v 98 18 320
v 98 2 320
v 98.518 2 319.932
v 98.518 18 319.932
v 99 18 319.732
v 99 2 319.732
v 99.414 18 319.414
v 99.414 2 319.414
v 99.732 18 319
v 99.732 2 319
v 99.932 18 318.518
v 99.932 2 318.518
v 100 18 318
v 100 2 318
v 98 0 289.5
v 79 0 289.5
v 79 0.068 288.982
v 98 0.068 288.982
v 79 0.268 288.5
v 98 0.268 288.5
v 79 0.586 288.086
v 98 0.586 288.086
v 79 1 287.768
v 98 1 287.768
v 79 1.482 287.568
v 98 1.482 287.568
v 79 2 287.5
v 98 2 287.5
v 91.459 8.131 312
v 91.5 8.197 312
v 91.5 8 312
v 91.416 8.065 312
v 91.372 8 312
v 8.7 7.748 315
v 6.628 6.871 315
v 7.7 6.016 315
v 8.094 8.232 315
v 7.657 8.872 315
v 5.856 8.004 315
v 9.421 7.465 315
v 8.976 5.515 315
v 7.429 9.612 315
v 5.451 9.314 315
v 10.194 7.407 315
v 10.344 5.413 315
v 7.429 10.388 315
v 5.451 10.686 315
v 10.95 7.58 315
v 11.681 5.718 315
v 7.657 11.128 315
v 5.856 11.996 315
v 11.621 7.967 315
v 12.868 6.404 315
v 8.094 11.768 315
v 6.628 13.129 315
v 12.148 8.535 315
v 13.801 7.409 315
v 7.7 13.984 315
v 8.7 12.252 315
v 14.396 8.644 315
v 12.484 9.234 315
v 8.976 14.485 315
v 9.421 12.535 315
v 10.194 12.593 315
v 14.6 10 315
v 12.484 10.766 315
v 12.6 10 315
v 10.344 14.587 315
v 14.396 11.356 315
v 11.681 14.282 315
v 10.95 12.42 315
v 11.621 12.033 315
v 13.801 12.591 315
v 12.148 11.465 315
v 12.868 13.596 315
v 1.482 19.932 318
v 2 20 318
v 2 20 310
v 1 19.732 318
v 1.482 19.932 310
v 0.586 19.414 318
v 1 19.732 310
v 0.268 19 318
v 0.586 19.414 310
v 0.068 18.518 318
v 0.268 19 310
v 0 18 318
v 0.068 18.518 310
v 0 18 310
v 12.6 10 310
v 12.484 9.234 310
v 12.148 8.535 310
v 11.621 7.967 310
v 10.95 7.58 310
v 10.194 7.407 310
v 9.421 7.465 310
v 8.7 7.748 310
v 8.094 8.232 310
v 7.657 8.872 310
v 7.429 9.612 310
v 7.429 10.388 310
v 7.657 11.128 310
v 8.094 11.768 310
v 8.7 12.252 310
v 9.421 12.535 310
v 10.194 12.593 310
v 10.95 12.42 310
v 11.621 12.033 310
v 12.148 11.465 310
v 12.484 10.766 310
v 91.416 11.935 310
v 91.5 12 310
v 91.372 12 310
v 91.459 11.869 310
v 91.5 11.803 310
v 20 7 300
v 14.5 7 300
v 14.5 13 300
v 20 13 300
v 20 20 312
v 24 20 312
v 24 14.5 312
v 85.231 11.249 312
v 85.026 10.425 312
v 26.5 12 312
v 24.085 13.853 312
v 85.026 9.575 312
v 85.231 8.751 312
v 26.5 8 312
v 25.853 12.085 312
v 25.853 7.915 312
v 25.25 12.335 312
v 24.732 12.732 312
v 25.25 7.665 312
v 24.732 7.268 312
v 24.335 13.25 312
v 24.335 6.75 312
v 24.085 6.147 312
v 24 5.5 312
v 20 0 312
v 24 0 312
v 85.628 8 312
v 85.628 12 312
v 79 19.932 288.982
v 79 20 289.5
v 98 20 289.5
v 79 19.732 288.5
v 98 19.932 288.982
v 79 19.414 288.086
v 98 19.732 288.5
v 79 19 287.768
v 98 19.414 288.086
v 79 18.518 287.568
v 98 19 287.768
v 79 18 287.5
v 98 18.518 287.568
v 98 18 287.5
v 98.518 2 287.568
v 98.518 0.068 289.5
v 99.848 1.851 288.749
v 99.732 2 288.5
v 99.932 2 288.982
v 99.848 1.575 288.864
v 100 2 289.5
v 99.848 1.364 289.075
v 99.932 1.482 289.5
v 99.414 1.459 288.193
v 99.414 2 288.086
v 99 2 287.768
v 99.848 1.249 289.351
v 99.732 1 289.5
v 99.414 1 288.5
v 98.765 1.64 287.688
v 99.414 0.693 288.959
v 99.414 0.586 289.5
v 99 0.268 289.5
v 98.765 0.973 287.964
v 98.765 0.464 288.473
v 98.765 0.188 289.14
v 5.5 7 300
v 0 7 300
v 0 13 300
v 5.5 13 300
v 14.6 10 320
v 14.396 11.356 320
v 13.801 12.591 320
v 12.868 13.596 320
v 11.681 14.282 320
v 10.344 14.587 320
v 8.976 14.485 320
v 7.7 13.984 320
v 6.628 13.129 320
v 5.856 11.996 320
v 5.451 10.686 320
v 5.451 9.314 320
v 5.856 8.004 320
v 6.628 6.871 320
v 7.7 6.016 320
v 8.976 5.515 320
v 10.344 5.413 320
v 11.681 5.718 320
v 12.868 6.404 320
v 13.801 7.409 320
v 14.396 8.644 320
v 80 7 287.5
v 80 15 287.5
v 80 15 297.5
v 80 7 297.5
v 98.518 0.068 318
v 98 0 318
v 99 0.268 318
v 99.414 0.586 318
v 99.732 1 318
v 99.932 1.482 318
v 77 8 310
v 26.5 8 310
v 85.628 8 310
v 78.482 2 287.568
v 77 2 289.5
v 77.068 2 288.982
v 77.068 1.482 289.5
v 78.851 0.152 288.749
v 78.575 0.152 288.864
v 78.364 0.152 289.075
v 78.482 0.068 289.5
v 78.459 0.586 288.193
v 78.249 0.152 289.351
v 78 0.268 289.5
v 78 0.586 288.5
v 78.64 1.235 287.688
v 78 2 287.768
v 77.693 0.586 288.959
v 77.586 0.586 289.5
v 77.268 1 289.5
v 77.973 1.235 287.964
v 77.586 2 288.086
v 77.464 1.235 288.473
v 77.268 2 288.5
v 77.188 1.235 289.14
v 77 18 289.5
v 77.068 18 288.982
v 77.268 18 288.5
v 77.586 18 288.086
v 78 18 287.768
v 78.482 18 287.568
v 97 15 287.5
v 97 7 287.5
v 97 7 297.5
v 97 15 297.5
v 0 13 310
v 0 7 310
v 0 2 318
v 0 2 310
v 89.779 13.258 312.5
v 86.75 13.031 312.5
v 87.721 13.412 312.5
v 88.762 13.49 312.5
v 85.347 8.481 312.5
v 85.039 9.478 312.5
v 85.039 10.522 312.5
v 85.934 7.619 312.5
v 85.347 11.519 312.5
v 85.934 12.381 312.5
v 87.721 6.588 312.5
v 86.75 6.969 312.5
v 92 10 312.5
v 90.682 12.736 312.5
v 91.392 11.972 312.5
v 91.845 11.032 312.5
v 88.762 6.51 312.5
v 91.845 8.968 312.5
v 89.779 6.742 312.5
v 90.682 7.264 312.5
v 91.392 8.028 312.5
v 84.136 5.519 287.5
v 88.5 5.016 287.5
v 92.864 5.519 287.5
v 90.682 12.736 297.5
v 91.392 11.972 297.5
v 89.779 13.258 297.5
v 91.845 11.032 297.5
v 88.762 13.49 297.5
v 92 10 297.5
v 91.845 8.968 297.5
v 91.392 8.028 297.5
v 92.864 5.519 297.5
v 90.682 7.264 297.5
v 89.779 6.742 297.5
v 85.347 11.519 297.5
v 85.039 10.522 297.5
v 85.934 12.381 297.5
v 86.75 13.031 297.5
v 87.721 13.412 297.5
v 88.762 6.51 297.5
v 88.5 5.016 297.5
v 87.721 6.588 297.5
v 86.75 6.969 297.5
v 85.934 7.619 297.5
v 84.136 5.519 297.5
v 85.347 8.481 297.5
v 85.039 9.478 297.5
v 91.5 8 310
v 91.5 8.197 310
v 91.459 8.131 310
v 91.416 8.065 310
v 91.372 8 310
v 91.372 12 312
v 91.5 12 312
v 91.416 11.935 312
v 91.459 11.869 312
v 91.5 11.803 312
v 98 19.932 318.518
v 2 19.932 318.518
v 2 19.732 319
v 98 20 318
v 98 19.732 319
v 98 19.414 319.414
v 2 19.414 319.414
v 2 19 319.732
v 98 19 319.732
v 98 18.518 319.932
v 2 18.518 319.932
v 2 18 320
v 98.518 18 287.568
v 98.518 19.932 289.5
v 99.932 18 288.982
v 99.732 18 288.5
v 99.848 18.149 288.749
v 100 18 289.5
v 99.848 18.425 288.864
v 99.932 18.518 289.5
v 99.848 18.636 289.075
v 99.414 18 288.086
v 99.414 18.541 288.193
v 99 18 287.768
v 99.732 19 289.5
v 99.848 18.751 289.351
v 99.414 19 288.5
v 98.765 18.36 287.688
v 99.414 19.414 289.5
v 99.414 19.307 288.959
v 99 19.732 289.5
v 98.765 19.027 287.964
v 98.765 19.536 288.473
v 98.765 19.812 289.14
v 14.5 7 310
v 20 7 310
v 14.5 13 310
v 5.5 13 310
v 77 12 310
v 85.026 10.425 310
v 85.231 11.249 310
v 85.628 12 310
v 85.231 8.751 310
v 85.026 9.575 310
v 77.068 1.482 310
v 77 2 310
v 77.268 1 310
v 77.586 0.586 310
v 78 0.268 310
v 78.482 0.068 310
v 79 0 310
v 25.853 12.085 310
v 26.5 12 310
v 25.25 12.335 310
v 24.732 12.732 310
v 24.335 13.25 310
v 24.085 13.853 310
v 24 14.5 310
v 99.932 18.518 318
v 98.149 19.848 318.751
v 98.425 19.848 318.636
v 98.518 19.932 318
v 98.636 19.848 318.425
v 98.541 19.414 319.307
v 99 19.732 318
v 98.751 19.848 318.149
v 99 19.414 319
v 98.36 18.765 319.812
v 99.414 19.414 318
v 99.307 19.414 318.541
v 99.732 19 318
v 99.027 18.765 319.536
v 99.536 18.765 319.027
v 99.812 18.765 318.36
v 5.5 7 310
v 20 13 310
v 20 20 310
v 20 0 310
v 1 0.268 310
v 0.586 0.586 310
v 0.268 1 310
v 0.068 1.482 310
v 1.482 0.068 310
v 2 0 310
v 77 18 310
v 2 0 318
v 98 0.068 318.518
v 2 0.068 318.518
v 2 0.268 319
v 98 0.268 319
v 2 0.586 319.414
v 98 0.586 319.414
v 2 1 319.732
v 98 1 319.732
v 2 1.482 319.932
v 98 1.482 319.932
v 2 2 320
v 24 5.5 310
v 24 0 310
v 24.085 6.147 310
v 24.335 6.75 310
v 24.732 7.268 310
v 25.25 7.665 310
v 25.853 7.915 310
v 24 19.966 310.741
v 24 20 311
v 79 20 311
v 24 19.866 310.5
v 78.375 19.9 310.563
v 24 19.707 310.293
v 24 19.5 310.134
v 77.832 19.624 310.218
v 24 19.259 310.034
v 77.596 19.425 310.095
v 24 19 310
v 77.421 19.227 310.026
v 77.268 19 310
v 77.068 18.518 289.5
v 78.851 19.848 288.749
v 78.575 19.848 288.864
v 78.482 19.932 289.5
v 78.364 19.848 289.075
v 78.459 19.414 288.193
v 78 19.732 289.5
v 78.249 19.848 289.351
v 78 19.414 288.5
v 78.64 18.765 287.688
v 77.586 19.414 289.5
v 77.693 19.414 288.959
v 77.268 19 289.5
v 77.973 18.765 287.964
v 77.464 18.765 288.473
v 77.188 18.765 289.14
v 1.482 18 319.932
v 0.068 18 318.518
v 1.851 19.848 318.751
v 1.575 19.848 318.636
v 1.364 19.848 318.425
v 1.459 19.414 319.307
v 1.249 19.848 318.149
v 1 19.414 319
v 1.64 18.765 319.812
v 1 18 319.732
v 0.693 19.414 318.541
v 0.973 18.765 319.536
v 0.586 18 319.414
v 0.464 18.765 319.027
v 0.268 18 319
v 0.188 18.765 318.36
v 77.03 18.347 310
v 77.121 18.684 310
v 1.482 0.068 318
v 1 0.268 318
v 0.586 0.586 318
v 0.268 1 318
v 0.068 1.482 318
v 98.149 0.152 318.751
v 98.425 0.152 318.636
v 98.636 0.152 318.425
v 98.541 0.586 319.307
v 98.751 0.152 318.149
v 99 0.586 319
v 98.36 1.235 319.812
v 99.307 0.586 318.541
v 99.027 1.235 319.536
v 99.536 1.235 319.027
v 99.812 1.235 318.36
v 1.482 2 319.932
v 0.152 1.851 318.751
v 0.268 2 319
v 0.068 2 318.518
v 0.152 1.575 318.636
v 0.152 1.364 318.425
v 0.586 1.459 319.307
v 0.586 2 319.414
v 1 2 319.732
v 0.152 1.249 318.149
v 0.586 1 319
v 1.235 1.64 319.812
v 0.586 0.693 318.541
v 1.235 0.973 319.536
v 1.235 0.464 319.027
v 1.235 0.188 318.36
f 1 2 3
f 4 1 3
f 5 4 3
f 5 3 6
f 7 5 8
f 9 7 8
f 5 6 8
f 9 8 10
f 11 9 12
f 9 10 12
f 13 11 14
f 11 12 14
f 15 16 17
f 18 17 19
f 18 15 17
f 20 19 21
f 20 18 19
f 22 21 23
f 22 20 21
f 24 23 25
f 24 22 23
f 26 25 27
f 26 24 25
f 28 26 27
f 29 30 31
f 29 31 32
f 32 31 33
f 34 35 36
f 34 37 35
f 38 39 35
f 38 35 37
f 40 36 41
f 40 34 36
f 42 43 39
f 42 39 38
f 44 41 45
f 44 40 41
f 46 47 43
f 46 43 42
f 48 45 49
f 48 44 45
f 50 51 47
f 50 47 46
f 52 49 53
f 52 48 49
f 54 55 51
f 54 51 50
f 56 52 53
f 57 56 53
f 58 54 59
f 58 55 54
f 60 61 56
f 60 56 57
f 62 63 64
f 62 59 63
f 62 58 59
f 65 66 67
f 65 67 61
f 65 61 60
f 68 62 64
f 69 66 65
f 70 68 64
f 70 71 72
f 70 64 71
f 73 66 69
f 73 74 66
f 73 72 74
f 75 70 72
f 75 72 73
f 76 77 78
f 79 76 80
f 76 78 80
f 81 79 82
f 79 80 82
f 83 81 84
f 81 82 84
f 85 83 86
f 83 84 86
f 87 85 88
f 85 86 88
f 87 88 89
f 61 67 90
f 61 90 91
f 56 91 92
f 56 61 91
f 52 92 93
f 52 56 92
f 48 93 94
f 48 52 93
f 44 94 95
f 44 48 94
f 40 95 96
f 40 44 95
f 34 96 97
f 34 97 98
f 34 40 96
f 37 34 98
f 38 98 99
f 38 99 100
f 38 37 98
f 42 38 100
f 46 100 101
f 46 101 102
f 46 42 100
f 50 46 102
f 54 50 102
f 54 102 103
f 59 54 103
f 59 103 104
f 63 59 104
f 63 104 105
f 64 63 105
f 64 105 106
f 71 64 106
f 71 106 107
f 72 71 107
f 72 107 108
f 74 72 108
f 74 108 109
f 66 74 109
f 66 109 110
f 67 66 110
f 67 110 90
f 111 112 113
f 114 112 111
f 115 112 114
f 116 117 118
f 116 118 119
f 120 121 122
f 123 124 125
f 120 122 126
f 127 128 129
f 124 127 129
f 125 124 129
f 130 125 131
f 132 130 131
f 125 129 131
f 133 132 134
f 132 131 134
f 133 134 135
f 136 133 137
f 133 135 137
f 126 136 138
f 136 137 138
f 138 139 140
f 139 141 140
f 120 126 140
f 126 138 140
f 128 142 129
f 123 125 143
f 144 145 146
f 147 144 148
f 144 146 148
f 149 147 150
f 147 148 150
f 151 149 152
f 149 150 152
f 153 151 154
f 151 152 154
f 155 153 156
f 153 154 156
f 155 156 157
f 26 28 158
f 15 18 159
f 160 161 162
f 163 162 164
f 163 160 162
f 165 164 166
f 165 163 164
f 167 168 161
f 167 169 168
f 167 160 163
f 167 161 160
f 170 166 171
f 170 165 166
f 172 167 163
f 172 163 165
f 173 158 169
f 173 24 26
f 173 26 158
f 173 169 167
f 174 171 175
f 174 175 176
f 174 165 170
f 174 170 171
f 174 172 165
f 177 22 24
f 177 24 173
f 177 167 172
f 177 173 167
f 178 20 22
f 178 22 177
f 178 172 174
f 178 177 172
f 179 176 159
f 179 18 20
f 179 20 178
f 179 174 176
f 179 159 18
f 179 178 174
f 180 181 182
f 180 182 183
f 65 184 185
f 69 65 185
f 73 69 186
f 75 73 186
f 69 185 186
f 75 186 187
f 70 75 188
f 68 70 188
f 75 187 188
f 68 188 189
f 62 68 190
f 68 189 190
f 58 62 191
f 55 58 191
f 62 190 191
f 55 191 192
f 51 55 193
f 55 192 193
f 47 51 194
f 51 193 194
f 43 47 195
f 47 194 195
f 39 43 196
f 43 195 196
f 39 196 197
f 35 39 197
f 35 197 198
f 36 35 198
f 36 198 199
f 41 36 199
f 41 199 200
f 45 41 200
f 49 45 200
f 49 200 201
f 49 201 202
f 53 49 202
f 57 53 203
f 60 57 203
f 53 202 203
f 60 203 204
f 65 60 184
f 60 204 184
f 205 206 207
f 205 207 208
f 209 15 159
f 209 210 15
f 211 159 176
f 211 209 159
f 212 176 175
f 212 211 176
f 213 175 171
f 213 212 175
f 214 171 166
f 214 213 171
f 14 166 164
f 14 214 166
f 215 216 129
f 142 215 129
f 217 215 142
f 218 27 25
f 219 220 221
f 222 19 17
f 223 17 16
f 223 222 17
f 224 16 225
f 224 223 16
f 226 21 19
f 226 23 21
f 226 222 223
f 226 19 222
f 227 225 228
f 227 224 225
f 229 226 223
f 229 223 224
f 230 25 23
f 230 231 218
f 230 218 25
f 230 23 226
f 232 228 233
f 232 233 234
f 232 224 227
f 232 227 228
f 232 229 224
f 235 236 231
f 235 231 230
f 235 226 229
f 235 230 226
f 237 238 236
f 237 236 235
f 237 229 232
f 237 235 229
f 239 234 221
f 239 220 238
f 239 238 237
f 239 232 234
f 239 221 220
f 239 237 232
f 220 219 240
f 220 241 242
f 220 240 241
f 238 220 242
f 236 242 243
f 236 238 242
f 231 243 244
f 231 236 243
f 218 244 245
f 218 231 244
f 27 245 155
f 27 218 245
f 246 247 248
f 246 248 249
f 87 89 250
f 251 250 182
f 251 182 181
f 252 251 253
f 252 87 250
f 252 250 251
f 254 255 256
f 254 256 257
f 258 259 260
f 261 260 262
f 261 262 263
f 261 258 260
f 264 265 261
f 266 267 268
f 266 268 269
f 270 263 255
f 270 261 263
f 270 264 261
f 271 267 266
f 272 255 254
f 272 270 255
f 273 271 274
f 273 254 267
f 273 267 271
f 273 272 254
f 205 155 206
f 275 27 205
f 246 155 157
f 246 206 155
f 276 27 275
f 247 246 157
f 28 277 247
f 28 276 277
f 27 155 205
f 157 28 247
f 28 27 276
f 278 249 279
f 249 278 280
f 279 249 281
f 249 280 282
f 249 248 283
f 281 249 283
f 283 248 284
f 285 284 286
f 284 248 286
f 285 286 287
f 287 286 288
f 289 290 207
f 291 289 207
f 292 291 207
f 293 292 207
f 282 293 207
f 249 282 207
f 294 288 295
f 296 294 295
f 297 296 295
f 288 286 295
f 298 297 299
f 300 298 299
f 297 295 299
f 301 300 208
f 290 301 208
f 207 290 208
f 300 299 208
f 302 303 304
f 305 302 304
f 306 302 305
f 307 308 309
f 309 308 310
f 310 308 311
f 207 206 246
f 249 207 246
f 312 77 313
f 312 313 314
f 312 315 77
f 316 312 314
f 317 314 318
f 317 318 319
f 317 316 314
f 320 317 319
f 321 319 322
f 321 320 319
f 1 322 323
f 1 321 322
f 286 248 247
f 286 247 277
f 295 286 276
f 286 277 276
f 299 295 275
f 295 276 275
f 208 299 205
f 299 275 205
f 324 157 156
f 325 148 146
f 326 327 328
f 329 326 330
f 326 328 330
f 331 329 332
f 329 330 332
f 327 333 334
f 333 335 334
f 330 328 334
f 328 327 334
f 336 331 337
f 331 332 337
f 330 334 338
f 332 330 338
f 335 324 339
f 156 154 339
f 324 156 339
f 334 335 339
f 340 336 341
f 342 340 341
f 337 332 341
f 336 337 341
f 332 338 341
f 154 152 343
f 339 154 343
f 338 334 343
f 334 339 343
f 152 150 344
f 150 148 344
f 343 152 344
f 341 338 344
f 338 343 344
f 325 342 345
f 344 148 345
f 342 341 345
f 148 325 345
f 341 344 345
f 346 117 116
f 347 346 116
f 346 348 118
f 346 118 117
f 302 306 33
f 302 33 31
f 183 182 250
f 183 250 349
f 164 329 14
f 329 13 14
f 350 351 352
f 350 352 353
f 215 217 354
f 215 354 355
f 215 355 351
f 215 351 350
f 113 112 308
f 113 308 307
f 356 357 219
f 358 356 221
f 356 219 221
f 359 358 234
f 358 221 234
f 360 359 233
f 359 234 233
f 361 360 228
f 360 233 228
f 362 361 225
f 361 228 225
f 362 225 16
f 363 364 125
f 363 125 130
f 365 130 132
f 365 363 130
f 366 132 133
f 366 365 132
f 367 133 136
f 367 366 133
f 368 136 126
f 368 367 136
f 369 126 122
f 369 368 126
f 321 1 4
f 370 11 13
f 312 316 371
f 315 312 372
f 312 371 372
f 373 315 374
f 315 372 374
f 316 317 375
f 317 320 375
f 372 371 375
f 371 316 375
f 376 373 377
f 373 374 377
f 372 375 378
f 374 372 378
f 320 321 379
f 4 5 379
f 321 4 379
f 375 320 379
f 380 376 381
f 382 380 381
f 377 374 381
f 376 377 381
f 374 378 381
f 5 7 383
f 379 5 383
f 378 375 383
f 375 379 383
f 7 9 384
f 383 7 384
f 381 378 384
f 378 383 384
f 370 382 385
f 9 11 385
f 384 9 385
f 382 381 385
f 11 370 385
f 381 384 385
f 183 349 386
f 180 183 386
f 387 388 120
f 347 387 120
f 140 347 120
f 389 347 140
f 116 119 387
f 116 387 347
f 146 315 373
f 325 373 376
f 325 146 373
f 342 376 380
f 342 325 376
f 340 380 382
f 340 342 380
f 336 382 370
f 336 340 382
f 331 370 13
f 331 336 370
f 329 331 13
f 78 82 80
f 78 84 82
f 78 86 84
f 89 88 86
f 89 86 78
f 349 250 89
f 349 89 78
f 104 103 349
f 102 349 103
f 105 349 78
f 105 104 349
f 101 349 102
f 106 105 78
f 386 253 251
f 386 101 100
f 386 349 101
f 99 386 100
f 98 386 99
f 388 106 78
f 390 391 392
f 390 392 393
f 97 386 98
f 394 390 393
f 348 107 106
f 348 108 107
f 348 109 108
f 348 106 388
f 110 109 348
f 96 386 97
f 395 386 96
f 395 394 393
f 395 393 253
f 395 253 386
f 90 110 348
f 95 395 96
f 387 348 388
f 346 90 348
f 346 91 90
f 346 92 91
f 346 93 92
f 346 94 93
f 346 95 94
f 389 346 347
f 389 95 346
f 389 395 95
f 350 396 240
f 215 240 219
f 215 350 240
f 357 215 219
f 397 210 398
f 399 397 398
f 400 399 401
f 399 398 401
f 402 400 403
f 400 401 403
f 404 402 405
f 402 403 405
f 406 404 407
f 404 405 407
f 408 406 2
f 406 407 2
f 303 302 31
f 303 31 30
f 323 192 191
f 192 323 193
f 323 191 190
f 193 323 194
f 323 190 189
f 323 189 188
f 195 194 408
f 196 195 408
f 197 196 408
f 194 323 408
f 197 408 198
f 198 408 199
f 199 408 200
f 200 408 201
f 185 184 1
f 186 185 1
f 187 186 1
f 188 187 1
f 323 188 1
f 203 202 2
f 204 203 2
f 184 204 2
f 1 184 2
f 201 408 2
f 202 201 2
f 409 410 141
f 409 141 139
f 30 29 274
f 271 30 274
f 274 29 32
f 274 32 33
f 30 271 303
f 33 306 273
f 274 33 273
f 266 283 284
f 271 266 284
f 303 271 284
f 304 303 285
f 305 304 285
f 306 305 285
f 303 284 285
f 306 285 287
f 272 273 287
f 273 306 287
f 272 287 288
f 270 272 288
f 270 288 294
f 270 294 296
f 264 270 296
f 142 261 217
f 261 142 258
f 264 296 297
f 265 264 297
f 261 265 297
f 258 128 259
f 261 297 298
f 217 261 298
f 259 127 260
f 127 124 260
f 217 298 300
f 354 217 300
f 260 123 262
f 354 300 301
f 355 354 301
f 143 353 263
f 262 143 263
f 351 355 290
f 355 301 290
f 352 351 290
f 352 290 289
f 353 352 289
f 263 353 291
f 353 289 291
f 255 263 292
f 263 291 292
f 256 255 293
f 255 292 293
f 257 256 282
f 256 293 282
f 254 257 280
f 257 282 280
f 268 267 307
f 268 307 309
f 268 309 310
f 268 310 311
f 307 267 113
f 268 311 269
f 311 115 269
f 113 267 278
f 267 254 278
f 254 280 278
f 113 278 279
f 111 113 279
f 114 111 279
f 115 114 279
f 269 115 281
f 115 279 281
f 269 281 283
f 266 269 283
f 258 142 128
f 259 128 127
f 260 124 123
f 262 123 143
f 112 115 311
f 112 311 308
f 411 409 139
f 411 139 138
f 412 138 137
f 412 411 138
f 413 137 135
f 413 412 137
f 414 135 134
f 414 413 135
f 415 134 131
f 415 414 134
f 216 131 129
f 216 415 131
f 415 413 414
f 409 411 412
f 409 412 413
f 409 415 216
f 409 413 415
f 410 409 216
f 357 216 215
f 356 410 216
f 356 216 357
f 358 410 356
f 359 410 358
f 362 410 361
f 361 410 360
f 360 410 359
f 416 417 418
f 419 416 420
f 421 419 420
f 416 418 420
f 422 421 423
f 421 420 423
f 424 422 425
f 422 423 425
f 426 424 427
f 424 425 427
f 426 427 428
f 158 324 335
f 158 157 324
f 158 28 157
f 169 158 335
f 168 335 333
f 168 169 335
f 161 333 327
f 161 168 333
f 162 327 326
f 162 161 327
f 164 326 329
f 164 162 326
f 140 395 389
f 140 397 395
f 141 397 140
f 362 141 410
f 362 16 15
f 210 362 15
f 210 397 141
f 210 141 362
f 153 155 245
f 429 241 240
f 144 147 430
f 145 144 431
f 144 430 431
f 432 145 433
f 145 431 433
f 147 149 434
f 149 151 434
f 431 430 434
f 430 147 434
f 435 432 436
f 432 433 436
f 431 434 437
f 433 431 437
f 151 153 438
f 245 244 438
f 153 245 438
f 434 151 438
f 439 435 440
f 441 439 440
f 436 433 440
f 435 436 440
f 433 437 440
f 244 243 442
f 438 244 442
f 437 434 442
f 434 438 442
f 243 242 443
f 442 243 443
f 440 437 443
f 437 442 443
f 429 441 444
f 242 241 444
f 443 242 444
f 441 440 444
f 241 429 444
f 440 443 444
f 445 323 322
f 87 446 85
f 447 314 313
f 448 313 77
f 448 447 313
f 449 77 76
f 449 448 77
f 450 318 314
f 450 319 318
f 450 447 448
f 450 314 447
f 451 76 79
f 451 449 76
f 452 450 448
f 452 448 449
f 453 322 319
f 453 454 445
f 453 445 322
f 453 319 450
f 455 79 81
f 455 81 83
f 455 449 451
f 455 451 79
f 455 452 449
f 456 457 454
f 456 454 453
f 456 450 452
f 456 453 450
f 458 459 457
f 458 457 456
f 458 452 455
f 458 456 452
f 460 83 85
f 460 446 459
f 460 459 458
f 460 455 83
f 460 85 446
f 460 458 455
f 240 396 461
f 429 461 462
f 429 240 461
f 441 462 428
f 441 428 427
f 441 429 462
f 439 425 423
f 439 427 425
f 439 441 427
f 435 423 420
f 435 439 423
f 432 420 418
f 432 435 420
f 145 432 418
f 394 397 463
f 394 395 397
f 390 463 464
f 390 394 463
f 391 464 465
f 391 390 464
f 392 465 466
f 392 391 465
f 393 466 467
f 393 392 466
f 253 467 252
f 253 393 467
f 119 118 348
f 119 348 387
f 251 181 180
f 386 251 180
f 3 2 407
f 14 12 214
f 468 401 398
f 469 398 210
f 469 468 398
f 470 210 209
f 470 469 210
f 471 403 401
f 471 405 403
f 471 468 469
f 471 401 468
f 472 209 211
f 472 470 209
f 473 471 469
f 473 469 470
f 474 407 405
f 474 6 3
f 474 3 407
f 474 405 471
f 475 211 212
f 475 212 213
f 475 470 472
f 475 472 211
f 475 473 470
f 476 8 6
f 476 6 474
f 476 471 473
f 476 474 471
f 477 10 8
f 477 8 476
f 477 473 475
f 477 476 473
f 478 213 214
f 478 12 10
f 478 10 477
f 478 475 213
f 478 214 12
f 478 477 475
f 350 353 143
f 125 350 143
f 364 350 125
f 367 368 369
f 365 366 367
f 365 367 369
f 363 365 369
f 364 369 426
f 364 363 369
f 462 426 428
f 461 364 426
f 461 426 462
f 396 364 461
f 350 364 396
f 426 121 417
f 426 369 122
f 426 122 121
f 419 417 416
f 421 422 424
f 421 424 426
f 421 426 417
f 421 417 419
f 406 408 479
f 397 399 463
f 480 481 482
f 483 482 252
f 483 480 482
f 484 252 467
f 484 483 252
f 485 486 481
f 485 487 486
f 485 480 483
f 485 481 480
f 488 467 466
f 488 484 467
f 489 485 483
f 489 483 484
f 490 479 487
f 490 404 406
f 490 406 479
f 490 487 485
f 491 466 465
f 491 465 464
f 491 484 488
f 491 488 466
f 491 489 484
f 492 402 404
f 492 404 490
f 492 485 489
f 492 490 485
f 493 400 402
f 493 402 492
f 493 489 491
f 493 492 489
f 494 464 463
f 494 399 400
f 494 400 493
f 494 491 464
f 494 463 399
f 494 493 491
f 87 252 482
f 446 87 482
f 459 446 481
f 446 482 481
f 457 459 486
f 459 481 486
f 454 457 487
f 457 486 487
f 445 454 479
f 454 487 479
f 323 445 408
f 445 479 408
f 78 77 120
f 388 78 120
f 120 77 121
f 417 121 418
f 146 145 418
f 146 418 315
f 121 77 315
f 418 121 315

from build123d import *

# Parameters (mm, degrees)
SKETCH010_W             = 100
SKETCH010_H             = 20
SKETCH010_R             = 2.6
PAD005_DEPTH            = 10
SKETCH012_W             = 23
SKETCH012_H             = 20
PAD003_DEPTH            = 22.5
POCKET005_DEPTH         = 10
SKETCH008_R             = 3.5
POCKET004_DEPTH         = 15
POCKET006_DEPTH         = 2
SKETCH013_W             = 5.5
SKETCH013_H             = 6
PAD004_DEPTH            = 10
FILLET002_R             = 2
FILLET003_R             = 1
SKETCH014_R             = 4.6
POCKET007_DEPTH         = 5
BODY001_PLACEMENT_ANGLE = 180


with BuildPart() as part:
    # Sketch010 → Pad005 (new body)
    with BuildSketch(Plane.XY):
        with Locations((50, 10)):
            Rectangle(SKETCH010_W, SKETCH010_H)
        with Locations((10, 10)):
            Circle(SKETCH010_R, mode=Mode.SUBTRACT)
    extrude(amount=PAD005_DEPTH)

    # Sketch012 (on Face7 of Pad005) → Pad003 (join)
    with BuildSketch(Plane.XY.offset(10)):
        with Locations((88.5, 10)):
            Rectangle(SKETCH012_W, SKETCH012_H)
    extrude(amount=PAD003_DEPTH)

    # Sketch009 (on Face11 of Pad003) → Pocket005 (cut)
    with BuildSketch(Plane.XY.offset(32.5)):
        with BuildLine():
            Line((97, 13), (97, 5))
            Line((80, 5), (97, 5))
            Line((80, 5), (80, 13))
            ThreePointArc((97, 13), (88.5, 14.984019), (80, 13))
        make_face()
    extrude(amount=-POCKET005_DEPTH, mode=Mode.SUBTRACT)

    # Sketch008 (on Face17 of Pocket005) → Pocket004 (cut)
    with BuildSketch(Plane.XY.offset(22.5)):
        with Locations((88.5, 10)):
            Circle(SKETCH008_R)
    extrude(amount=-POCKET004_DEPTH, mode=Mode.SUBTRACT)

    # Sketch011 (on Face5 of Pocket004) → Pocket006 (cut)
    with BuildSketch(Plane.XY.offset(10)):
        with BuildLine():
            Line((26.5, 12), (91.5, 12))
            Line((91.5, 12), (91.5, 8))
            Line((91.5, 8), (26.5, 8))
            ThreePointArc((26.5, 8), (24.732233, 7.267767), (24, 5.5))
            Line((24, 5.5), (24, 0))
            Line((24, 0), (20, 0))
            Line((20, 0), (20, 20))
            Line((20, 20), (24, 20))
            Line((24, 20), (24, 14.5))
            ThreePointArc((24, 14.5), (24.732233, 12.732233), (26.5, 12))
        make_face()
    extrude(amount=-POCKET006_DEPTH, mode=Mode.SUBTRACT)

    # Sketch013 → Pad004 (join)
    with BuildSketch(Plane.XY.offset(10)):
        with Locations((2.75, 10)):
            Rectangle(SKETCH013_W, SKETCH013_H)
        with Locations((17.25, 10)):
            Rectangle(SKETCH013_W, SKETCH013_H)
    extrude(amount=PAD004_DEPTH)

    # Fillet002
    fillet002_edges = [part.edges().sort_by_distance(p)[0] for p in [
        (77, 10, 32.5),
        (88.5, 0, 32.5),
        (88.5, 20, 32.5),
        (100, 10, 32.5),
        (100, 10, 0),
        (50, 20, 0),
        (0, 10, 0),
        (50, 0, 0),
        (77, 20, 21.25),
        (77, 0, 21.25),
        (100, 0, 21.25),
        (100, 20, 21.25),
        (0, 20, 5),
        (0, 0, 5),
    ]]
    fillet(fillet002_edges, radius=FILLET002_R)

    # Fillet003
    fillet003_edges = [part.edges().sort_by_distance(p)[0] for p in [
        (0, 18, 6),
        (50.5, 0, 10),
    ]]
    fillet(fillet003_edges, radius=FILLET003_R)

    # Sketch014 (on Face38 of Fillet003) → Pocket007 (cut)
    with BuildSketch(Plane(origin=(0, 0, 0), x_dir=(1, 0, 0), z_dir=(0, 0, -1))):
        with Locations((10, -10)):
            Circle(SKETCH014_R)
    extrude(amount=-POCKET007_DEPTH, mode=Mode.SUBTRACT)


with BuildPart() as part_1:
    # Body001 placement: moved
    add(part.part.moved(Location((0, 20, 320))).rotate(Axis((0, 20, 320), (1, 0, 0)), BODY001_PLACEMENT_ANGLE))


solid = part_1.part
